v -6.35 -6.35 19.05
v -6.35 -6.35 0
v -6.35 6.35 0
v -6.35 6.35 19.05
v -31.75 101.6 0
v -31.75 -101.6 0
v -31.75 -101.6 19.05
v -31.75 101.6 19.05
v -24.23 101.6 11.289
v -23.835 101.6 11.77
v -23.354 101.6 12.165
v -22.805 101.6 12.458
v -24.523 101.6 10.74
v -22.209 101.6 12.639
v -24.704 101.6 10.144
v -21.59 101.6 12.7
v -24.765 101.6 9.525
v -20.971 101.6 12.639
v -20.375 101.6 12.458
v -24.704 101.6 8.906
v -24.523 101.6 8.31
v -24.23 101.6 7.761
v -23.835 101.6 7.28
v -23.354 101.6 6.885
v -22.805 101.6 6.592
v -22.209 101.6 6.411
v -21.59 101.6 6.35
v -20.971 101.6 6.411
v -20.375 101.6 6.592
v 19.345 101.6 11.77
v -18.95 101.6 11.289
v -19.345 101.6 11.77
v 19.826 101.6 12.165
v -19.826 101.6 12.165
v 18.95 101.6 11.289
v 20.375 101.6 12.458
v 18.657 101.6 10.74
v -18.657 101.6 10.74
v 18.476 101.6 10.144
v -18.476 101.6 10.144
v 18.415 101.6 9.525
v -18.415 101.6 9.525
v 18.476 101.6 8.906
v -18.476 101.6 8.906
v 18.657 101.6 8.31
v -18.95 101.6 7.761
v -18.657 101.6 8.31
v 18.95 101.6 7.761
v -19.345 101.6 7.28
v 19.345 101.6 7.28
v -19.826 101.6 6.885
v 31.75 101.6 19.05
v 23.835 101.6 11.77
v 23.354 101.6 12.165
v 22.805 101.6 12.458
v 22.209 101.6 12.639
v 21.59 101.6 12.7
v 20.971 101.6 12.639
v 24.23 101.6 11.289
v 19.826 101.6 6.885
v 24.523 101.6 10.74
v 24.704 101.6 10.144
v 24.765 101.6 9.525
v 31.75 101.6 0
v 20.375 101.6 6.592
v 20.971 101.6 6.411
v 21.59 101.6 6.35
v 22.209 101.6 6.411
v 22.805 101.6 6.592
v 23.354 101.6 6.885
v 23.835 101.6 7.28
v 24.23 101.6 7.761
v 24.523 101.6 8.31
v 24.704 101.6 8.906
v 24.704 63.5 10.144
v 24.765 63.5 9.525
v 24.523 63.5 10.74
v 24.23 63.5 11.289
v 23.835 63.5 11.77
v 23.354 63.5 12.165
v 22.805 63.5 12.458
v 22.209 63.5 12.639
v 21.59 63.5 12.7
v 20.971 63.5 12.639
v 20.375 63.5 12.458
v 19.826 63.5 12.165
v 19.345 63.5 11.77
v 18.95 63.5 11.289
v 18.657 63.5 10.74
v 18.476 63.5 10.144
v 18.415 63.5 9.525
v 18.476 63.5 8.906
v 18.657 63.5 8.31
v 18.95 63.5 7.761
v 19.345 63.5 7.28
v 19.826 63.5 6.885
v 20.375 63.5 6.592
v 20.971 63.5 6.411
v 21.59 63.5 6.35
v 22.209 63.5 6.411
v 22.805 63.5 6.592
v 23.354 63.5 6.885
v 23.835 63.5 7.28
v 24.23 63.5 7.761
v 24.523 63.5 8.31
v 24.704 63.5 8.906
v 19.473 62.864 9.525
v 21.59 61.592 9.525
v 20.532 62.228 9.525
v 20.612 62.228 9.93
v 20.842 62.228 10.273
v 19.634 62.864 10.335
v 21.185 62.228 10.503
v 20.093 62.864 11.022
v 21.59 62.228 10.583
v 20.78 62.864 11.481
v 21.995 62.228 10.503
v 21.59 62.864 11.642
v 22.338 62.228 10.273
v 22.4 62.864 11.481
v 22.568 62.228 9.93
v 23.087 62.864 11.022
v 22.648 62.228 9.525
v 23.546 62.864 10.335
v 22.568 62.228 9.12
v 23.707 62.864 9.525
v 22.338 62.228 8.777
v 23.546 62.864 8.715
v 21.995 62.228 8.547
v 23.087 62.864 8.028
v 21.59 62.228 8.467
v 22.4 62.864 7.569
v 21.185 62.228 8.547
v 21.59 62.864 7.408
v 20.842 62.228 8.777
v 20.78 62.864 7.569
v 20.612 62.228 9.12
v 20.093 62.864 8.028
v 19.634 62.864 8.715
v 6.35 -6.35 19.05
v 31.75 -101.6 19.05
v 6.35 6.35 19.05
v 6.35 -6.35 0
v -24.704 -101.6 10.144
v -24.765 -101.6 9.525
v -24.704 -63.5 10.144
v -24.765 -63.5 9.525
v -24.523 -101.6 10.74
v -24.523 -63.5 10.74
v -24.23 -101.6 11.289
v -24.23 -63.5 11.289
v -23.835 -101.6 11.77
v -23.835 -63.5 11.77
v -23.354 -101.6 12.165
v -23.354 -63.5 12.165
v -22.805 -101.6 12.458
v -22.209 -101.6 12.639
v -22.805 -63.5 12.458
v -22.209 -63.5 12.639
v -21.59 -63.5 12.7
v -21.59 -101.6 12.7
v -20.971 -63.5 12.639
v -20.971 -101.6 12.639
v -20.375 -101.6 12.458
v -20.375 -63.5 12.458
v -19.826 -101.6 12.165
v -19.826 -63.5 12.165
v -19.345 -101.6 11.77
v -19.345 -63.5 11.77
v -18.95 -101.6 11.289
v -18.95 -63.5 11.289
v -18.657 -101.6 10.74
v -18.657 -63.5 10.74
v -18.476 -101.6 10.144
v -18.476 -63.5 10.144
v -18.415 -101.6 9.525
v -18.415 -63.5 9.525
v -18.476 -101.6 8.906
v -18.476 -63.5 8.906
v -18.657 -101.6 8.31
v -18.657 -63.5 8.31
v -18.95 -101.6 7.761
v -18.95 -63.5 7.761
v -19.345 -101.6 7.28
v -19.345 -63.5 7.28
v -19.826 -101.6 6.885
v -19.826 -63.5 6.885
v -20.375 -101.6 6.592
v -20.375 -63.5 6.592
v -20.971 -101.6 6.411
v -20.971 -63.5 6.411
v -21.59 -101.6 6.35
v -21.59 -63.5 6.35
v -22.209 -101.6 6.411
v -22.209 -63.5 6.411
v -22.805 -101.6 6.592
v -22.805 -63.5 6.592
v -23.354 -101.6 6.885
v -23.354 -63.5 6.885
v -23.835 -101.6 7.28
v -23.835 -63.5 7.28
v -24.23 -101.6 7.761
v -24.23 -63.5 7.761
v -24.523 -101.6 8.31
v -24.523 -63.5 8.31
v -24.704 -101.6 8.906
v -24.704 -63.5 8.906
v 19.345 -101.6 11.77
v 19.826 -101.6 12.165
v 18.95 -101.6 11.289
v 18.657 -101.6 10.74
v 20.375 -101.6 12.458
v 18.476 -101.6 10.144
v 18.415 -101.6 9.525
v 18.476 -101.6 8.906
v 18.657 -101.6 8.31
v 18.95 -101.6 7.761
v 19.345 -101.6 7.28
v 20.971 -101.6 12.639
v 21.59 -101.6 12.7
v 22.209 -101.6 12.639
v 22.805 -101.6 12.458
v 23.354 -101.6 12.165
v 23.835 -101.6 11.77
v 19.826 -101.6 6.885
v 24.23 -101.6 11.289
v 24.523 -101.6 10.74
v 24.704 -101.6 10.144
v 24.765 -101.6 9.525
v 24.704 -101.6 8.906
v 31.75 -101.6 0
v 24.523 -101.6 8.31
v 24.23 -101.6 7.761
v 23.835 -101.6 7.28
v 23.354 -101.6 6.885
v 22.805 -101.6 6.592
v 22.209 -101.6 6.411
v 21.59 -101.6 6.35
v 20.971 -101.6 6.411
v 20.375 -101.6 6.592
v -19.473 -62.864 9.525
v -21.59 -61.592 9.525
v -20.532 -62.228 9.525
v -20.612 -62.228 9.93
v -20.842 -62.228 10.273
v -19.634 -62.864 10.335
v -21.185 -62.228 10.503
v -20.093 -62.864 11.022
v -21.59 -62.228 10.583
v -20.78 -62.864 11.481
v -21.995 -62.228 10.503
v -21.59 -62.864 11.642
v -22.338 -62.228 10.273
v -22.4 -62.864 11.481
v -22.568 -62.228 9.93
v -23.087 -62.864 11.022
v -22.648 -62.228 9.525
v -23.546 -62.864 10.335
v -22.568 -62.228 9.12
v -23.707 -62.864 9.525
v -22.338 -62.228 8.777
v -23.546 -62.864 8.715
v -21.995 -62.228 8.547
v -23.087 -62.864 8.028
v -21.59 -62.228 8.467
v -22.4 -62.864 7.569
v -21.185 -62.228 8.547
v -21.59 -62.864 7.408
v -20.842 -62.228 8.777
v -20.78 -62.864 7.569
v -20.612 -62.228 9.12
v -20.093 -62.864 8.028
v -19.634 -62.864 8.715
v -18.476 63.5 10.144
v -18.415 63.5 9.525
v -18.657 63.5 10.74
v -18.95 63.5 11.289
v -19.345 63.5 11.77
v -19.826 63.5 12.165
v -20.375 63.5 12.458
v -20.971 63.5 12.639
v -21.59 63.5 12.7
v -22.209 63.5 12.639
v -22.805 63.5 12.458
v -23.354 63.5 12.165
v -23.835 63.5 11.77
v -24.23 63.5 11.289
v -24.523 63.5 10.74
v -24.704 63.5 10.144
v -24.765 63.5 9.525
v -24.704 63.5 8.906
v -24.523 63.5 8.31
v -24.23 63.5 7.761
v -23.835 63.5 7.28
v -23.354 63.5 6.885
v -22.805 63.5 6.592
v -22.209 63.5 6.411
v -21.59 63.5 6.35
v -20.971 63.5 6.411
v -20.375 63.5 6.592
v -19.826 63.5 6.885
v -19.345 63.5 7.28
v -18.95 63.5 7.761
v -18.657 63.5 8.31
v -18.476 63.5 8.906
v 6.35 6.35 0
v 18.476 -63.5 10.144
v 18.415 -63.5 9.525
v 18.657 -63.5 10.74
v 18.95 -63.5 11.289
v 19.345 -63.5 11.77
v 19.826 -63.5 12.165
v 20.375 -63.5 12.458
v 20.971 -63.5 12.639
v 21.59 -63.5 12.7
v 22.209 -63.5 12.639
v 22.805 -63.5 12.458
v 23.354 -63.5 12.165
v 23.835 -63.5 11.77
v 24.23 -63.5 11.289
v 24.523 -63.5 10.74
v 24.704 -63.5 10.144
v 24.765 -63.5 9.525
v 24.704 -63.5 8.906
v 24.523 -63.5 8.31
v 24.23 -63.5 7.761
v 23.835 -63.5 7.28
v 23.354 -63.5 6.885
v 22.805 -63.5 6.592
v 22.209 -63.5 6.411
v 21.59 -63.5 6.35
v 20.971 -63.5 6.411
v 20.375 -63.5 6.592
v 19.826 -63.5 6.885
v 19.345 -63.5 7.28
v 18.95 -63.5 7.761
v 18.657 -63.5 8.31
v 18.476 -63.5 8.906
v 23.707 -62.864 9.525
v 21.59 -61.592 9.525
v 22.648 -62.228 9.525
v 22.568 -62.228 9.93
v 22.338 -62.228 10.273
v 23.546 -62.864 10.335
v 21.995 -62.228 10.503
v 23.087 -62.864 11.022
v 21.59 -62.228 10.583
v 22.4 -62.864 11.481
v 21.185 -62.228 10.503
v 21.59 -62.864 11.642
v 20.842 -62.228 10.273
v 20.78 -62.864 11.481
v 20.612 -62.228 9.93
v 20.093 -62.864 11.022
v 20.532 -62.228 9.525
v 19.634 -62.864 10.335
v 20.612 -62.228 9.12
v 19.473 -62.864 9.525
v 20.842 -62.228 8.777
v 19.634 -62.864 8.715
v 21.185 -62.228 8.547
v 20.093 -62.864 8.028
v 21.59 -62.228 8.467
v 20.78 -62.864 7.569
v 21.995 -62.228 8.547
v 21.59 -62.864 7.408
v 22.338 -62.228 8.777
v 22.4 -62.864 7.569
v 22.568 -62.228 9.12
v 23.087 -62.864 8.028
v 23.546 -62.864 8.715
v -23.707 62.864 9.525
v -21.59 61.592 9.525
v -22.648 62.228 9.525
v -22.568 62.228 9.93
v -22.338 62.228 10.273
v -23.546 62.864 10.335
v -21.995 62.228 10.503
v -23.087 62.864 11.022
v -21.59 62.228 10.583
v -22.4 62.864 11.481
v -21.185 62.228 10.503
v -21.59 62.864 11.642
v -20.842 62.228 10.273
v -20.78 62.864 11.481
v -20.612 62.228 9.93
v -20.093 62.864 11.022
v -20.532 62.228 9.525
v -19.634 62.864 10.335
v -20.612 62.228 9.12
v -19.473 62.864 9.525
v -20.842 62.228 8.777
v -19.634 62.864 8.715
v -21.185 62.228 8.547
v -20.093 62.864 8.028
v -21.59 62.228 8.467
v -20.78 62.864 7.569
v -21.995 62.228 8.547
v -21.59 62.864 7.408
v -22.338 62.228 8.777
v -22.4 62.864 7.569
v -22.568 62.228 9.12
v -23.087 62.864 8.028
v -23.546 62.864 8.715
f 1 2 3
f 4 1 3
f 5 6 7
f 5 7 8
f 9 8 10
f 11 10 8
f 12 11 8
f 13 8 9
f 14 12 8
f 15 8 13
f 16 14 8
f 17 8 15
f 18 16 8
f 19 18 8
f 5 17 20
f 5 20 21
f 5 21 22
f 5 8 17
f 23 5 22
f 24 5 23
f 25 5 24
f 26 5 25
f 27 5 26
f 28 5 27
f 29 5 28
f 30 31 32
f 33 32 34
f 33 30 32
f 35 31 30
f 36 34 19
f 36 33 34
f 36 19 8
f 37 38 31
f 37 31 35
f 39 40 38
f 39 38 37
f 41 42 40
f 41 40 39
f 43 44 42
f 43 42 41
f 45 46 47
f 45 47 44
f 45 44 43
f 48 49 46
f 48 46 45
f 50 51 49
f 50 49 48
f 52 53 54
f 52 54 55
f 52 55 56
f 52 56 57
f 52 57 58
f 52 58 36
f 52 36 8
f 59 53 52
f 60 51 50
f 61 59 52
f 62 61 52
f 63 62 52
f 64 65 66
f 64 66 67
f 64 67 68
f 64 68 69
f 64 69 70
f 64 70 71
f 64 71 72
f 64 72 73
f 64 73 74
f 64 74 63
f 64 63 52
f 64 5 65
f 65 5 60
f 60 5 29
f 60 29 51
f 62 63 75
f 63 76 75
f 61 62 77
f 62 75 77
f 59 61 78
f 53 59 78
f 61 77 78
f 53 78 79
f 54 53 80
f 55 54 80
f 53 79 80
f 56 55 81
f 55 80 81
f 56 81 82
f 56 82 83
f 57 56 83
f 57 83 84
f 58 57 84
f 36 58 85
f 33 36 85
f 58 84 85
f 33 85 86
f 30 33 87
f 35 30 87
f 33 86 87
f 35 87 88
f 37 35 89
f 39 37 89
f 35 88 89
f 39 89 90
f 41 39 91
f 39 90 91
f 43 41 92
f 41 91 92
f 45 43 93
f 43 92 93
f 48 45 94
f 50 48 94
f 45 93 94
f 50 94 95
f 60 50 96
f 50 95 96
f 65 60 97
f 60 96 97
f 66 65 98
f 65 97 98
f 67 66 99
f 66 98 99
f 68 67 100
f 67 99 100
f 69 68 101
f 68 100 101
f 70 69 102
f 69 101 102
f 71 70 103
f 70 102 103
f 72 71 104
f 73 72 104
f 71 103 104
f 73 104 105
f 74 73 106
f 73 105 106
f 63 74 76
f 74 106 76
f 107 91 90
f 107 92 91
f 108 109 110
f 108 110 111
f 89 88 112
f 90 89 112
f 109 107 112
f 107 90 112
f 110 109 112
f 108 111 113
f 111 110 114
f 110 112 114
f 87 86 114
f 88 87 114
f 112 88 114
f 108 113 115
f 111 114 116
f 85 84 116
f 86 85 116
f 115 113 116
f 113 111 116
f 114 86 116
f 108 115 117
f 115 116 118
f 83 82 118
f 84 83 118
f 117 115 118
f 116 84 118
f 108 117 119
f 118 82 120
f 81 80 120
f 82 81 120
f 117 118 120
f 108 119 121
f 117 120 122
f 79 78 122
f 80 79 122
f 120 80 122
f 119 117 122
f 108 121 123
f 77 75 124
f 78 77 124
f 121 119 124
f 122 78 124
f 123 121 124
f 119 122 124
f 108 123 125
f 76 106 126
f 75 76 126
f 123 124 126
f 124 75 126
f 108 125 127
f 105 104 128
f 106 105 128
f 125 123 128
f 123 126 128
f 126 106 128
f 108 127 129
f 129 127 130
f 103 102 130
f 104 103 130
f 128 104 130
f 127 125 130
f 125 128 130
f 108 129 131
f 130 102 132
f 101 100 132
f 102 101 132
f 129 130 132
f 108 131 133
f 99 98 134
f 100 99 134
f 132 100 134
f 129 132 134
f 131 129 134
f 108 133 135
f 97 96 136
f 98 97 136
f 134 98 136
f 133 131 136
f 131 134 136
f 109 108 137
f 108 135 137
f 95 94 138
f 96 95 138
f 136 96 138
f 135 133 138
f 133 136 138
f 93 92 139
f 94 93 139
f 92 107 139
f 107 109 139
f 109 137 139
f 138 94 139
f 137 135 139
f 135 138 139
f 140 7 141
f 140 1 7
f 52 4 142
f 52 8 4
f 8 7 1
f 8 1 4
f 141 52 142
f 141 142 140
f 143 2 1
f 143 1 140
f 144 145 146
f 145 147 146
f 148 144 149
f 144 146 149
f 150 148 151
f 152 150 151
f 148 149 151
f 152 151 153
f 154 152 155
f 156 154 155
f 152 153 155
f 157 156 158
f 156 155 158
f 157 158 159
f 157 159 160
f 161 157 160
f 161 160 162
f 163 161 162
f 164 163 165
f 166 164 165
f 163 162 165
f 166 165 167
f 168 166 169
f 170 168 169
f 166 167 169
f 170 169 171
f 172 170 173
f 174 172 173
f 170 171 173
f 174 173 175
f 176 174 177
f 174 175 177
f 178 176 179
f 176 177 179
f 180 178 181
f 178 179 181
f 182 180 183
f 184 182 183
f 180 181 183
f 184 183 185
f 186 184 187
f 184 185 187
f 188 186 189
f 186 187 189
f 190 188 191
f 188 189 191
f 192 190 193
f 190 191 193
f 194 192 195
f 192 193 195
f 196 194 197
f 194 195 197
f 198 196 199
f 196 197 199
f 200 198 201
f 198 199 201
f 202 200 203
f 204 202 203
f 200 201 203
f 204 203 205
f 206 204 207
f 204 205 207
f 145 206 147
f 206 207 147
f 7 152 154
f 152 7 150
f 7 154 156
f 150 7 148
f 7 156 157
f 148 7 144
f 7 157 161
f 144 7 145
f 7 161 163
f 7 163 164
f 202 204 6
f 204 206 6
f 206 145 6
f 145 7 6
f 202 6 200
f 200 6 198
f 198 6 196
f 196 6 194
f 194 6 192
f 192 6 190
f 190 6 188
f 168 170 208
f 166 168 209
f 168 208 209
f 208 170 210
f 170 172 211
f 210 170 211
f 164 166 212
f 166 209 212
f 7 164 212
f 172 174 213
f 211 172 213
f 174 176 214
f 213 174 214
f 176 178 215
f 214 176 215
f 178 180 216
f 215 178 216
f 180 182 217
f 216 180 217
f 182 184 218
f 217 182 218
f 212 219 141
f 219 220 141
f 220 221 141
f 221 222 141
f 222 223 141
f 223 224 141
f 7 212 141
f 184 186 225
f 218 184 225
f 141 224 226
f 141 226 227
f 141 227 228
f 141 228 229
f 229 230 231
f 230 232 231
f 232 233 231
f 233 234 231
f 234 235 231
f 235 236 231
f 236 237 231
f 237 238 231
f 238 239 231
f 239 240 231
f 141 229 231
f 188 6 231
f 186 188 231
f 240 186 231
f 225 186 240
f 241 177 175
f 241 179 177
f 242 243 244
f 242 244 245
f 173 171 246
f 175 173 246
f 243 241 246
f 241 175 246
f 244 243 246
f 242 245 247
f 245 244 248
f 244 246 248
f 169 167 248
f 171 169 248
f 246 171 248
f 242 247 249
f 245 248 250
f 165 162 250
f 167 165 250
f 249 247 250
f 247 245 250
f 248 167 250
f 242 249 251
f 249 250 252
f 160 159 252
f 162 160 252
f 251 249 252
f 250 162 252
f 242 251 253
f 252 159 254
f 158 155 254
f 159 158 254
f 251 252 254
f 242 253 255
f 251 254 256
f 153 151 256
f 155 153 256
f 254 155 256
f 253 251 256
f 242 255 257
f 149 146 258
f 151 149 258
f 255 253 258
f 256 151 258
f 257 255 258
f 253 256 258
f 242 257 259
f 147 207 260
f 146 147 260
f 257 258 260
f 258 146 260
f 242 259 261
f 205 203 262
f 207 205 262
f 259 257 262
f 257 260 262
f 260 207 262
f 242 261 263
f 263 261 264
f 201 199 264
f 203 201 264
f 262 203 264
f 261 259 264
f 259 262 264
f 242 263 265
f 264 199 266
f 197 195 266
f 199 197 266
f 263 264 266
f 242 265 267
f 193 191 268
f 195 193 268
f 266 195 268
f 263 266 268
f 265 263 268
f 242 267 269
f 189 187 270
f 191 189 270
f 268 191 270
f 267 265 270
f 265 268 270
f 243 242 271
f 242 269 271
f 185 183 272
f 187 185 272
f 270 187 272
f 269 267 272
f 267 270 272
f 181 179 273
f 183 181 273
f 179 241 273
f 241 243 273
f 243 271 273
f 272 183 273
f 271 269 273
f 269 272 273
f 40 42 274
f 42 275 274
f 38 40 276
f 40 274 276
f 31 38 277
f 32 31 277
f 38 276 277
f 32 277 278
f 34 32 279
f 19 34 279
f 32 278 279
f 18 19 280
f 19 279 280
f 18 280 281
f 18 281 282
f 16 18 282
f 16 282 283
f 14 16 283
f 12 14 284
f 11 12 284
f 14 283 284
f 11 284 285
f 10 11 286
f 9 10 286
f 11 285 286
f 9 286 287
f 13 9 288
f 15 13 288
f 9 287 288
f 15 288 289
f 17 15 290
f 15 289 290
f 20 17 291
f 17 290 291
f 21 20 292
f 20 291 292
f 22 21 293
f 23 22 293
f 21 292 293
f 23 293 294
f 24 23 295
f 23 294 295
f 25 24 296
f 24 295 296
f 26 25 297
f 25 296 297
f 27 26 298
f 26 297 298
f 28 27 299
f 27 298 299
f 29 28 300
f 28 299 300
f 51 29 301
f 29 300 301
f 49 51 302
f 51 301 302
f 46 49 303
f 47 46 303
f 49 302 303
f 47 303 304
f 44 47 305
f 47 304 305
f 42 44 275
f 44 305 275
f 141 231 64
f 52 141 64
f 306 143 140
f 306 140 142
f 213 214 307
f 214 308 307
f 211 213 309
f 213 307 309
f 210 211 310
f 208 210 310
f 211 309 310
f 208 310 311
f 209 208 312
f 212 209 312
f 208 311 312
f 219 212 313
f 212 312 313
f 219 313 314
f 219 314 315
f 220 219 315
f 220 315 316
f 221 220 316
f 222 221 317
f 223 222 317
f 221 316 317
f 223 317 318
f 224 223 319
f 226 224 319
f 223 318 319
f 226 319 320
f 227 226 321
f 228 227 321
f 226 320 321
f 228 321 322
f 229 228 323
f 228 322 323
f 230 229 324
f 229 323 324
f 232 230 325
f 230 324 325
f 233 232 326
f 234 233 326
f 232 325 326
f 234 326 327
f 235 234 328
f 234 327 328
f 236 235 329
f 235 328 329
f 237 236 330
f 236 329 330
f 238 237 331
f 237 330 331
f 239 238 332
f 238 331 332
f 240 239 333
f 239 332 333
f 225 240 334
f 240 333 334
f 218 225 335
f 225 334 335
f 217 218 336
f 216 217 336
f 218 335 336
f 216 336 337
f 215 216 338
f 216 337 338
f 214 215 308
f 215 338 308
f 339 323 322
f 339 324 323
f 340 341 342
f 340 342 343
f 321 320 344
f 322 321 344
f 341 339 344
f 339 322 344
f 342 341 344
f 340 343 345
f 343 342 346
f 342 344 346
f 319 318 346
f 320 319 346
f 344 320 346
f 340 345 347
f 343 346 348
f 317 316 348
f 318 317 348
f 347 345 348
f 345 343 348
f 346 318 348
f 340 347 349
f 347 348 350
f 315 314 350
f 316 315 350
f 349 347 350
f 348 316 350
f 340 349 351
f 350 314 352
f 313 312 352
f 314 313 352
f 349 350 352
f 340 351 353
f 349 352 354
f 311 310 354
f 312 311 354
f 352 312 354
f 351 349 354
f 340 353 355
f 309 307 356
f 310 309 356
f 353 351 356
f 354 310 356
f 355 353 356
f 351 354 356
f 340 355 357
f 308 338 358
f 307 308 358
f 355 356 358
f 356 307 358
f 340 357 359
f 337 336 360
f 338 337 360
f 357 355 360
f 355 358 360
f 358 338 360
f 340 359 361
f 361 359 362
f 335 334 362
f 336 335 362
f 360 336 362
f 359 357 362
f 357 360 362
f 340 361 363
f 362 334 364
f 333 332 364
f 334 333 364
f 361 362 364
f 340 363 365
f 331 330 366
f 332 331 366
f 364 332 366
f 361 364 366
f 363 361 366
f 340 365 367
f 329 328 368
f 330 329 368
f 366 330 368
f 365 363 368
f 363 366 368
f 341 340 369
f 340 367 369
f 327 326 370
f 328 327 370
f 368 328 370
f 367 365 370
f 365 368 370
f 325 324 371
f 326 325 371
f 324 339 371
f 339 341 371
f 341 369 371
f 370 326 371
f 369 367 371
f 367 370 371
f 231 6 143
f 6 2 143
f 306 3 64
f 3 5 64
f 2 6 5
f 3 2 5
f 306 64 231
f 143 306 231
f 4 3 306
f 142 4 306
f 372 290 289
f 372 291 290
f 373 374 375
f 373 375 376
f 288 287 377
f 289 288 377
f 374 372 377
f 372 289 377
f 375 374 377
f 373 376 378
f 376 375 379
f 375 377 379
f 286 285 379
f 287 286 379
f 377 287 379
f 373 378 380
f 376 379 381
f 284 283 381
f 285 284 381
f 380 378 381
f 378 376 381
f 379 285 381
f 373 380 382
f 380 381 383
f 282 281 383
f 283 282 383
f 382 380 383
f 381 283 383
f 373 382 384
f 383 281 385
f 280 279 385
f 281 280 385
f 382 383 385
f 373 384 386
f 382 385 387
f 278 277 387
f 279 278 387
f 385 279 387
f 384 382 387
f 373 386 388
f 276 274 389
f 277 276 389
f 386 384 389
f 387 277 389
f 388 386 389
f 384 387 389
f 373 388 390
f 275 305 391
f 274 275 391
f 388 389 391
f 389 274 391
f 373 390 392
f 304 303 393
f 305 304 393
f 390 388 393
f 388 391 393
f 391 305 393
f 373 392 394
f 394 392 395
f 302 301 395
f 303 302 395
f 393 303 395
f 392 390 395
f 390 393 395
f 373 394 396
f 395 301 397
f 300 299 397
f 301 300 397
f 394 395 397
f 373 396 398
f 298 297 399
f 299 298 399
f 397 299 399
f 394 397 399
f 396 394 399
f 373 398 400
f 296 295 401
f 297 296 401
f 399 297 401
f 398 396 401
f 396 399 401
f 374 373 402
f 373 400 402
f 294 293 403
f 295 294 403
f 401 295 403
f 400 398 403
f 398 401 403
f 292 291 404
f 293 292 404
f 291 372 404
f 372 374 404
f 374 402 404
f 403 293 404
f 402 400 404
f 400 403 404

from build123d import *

# Parameters (mm, degrees)
F0_W     = 63.5
F0_H     = 203.2
F0_W_2   = 12.7
F0_H_2   = 12.7
F1_DEPTH = 19.05
F3_D     = 6.35
F3_DEPTH = 38.1
F3_TIP   = 1.9077324654
F5_D     = 6.35
F5_DEPTH = 38.1
F5_TIP   = 1.9077324654


with BuildPart() as f1:
    # F0 (on Top) → F1 (new body)
    with BuildSketch(Plane.XY):
        Rectangle(F0_W, F0_H)
        Rectangle(F0_W_2, F0_H_2, mode=Mode.SUBTRACT)
    extrude(amount=F1_DEPTH)

    # F3
    with Locations(Plane.XZ.offset(101.6)):
        with Locations((-21.59, 9.525), (21.59, 9.525)):
            Hole(F3_D / 2, depth=F3_DEPTH)
            with Locations((0, 0, -(F3_DEPTH + F3_TIP / 2))):  # 118° drill point
                Cone(0, F3_D / 2, F3_TIP, mode=Mode.SUBTRACT)

    # F5
    with Locations(Plane(origin=(0, 101.6, 0), x_dir=(-1, 0, 0), z_dir=(0, 1, 0))):
        with Locations((21.59, 9.525), (-21.59, 9.525)):
            Hole(F5_D / 2, depth=F5_DEPTH)
            with Locations((0, 0, -(F5_DEPTH + F5_TIP / 2))):  # 118° drill point
                Cone(0, F5_D / 2, F5_TIP, mode=Mode.SUBTRACT)


solid = f1.part
